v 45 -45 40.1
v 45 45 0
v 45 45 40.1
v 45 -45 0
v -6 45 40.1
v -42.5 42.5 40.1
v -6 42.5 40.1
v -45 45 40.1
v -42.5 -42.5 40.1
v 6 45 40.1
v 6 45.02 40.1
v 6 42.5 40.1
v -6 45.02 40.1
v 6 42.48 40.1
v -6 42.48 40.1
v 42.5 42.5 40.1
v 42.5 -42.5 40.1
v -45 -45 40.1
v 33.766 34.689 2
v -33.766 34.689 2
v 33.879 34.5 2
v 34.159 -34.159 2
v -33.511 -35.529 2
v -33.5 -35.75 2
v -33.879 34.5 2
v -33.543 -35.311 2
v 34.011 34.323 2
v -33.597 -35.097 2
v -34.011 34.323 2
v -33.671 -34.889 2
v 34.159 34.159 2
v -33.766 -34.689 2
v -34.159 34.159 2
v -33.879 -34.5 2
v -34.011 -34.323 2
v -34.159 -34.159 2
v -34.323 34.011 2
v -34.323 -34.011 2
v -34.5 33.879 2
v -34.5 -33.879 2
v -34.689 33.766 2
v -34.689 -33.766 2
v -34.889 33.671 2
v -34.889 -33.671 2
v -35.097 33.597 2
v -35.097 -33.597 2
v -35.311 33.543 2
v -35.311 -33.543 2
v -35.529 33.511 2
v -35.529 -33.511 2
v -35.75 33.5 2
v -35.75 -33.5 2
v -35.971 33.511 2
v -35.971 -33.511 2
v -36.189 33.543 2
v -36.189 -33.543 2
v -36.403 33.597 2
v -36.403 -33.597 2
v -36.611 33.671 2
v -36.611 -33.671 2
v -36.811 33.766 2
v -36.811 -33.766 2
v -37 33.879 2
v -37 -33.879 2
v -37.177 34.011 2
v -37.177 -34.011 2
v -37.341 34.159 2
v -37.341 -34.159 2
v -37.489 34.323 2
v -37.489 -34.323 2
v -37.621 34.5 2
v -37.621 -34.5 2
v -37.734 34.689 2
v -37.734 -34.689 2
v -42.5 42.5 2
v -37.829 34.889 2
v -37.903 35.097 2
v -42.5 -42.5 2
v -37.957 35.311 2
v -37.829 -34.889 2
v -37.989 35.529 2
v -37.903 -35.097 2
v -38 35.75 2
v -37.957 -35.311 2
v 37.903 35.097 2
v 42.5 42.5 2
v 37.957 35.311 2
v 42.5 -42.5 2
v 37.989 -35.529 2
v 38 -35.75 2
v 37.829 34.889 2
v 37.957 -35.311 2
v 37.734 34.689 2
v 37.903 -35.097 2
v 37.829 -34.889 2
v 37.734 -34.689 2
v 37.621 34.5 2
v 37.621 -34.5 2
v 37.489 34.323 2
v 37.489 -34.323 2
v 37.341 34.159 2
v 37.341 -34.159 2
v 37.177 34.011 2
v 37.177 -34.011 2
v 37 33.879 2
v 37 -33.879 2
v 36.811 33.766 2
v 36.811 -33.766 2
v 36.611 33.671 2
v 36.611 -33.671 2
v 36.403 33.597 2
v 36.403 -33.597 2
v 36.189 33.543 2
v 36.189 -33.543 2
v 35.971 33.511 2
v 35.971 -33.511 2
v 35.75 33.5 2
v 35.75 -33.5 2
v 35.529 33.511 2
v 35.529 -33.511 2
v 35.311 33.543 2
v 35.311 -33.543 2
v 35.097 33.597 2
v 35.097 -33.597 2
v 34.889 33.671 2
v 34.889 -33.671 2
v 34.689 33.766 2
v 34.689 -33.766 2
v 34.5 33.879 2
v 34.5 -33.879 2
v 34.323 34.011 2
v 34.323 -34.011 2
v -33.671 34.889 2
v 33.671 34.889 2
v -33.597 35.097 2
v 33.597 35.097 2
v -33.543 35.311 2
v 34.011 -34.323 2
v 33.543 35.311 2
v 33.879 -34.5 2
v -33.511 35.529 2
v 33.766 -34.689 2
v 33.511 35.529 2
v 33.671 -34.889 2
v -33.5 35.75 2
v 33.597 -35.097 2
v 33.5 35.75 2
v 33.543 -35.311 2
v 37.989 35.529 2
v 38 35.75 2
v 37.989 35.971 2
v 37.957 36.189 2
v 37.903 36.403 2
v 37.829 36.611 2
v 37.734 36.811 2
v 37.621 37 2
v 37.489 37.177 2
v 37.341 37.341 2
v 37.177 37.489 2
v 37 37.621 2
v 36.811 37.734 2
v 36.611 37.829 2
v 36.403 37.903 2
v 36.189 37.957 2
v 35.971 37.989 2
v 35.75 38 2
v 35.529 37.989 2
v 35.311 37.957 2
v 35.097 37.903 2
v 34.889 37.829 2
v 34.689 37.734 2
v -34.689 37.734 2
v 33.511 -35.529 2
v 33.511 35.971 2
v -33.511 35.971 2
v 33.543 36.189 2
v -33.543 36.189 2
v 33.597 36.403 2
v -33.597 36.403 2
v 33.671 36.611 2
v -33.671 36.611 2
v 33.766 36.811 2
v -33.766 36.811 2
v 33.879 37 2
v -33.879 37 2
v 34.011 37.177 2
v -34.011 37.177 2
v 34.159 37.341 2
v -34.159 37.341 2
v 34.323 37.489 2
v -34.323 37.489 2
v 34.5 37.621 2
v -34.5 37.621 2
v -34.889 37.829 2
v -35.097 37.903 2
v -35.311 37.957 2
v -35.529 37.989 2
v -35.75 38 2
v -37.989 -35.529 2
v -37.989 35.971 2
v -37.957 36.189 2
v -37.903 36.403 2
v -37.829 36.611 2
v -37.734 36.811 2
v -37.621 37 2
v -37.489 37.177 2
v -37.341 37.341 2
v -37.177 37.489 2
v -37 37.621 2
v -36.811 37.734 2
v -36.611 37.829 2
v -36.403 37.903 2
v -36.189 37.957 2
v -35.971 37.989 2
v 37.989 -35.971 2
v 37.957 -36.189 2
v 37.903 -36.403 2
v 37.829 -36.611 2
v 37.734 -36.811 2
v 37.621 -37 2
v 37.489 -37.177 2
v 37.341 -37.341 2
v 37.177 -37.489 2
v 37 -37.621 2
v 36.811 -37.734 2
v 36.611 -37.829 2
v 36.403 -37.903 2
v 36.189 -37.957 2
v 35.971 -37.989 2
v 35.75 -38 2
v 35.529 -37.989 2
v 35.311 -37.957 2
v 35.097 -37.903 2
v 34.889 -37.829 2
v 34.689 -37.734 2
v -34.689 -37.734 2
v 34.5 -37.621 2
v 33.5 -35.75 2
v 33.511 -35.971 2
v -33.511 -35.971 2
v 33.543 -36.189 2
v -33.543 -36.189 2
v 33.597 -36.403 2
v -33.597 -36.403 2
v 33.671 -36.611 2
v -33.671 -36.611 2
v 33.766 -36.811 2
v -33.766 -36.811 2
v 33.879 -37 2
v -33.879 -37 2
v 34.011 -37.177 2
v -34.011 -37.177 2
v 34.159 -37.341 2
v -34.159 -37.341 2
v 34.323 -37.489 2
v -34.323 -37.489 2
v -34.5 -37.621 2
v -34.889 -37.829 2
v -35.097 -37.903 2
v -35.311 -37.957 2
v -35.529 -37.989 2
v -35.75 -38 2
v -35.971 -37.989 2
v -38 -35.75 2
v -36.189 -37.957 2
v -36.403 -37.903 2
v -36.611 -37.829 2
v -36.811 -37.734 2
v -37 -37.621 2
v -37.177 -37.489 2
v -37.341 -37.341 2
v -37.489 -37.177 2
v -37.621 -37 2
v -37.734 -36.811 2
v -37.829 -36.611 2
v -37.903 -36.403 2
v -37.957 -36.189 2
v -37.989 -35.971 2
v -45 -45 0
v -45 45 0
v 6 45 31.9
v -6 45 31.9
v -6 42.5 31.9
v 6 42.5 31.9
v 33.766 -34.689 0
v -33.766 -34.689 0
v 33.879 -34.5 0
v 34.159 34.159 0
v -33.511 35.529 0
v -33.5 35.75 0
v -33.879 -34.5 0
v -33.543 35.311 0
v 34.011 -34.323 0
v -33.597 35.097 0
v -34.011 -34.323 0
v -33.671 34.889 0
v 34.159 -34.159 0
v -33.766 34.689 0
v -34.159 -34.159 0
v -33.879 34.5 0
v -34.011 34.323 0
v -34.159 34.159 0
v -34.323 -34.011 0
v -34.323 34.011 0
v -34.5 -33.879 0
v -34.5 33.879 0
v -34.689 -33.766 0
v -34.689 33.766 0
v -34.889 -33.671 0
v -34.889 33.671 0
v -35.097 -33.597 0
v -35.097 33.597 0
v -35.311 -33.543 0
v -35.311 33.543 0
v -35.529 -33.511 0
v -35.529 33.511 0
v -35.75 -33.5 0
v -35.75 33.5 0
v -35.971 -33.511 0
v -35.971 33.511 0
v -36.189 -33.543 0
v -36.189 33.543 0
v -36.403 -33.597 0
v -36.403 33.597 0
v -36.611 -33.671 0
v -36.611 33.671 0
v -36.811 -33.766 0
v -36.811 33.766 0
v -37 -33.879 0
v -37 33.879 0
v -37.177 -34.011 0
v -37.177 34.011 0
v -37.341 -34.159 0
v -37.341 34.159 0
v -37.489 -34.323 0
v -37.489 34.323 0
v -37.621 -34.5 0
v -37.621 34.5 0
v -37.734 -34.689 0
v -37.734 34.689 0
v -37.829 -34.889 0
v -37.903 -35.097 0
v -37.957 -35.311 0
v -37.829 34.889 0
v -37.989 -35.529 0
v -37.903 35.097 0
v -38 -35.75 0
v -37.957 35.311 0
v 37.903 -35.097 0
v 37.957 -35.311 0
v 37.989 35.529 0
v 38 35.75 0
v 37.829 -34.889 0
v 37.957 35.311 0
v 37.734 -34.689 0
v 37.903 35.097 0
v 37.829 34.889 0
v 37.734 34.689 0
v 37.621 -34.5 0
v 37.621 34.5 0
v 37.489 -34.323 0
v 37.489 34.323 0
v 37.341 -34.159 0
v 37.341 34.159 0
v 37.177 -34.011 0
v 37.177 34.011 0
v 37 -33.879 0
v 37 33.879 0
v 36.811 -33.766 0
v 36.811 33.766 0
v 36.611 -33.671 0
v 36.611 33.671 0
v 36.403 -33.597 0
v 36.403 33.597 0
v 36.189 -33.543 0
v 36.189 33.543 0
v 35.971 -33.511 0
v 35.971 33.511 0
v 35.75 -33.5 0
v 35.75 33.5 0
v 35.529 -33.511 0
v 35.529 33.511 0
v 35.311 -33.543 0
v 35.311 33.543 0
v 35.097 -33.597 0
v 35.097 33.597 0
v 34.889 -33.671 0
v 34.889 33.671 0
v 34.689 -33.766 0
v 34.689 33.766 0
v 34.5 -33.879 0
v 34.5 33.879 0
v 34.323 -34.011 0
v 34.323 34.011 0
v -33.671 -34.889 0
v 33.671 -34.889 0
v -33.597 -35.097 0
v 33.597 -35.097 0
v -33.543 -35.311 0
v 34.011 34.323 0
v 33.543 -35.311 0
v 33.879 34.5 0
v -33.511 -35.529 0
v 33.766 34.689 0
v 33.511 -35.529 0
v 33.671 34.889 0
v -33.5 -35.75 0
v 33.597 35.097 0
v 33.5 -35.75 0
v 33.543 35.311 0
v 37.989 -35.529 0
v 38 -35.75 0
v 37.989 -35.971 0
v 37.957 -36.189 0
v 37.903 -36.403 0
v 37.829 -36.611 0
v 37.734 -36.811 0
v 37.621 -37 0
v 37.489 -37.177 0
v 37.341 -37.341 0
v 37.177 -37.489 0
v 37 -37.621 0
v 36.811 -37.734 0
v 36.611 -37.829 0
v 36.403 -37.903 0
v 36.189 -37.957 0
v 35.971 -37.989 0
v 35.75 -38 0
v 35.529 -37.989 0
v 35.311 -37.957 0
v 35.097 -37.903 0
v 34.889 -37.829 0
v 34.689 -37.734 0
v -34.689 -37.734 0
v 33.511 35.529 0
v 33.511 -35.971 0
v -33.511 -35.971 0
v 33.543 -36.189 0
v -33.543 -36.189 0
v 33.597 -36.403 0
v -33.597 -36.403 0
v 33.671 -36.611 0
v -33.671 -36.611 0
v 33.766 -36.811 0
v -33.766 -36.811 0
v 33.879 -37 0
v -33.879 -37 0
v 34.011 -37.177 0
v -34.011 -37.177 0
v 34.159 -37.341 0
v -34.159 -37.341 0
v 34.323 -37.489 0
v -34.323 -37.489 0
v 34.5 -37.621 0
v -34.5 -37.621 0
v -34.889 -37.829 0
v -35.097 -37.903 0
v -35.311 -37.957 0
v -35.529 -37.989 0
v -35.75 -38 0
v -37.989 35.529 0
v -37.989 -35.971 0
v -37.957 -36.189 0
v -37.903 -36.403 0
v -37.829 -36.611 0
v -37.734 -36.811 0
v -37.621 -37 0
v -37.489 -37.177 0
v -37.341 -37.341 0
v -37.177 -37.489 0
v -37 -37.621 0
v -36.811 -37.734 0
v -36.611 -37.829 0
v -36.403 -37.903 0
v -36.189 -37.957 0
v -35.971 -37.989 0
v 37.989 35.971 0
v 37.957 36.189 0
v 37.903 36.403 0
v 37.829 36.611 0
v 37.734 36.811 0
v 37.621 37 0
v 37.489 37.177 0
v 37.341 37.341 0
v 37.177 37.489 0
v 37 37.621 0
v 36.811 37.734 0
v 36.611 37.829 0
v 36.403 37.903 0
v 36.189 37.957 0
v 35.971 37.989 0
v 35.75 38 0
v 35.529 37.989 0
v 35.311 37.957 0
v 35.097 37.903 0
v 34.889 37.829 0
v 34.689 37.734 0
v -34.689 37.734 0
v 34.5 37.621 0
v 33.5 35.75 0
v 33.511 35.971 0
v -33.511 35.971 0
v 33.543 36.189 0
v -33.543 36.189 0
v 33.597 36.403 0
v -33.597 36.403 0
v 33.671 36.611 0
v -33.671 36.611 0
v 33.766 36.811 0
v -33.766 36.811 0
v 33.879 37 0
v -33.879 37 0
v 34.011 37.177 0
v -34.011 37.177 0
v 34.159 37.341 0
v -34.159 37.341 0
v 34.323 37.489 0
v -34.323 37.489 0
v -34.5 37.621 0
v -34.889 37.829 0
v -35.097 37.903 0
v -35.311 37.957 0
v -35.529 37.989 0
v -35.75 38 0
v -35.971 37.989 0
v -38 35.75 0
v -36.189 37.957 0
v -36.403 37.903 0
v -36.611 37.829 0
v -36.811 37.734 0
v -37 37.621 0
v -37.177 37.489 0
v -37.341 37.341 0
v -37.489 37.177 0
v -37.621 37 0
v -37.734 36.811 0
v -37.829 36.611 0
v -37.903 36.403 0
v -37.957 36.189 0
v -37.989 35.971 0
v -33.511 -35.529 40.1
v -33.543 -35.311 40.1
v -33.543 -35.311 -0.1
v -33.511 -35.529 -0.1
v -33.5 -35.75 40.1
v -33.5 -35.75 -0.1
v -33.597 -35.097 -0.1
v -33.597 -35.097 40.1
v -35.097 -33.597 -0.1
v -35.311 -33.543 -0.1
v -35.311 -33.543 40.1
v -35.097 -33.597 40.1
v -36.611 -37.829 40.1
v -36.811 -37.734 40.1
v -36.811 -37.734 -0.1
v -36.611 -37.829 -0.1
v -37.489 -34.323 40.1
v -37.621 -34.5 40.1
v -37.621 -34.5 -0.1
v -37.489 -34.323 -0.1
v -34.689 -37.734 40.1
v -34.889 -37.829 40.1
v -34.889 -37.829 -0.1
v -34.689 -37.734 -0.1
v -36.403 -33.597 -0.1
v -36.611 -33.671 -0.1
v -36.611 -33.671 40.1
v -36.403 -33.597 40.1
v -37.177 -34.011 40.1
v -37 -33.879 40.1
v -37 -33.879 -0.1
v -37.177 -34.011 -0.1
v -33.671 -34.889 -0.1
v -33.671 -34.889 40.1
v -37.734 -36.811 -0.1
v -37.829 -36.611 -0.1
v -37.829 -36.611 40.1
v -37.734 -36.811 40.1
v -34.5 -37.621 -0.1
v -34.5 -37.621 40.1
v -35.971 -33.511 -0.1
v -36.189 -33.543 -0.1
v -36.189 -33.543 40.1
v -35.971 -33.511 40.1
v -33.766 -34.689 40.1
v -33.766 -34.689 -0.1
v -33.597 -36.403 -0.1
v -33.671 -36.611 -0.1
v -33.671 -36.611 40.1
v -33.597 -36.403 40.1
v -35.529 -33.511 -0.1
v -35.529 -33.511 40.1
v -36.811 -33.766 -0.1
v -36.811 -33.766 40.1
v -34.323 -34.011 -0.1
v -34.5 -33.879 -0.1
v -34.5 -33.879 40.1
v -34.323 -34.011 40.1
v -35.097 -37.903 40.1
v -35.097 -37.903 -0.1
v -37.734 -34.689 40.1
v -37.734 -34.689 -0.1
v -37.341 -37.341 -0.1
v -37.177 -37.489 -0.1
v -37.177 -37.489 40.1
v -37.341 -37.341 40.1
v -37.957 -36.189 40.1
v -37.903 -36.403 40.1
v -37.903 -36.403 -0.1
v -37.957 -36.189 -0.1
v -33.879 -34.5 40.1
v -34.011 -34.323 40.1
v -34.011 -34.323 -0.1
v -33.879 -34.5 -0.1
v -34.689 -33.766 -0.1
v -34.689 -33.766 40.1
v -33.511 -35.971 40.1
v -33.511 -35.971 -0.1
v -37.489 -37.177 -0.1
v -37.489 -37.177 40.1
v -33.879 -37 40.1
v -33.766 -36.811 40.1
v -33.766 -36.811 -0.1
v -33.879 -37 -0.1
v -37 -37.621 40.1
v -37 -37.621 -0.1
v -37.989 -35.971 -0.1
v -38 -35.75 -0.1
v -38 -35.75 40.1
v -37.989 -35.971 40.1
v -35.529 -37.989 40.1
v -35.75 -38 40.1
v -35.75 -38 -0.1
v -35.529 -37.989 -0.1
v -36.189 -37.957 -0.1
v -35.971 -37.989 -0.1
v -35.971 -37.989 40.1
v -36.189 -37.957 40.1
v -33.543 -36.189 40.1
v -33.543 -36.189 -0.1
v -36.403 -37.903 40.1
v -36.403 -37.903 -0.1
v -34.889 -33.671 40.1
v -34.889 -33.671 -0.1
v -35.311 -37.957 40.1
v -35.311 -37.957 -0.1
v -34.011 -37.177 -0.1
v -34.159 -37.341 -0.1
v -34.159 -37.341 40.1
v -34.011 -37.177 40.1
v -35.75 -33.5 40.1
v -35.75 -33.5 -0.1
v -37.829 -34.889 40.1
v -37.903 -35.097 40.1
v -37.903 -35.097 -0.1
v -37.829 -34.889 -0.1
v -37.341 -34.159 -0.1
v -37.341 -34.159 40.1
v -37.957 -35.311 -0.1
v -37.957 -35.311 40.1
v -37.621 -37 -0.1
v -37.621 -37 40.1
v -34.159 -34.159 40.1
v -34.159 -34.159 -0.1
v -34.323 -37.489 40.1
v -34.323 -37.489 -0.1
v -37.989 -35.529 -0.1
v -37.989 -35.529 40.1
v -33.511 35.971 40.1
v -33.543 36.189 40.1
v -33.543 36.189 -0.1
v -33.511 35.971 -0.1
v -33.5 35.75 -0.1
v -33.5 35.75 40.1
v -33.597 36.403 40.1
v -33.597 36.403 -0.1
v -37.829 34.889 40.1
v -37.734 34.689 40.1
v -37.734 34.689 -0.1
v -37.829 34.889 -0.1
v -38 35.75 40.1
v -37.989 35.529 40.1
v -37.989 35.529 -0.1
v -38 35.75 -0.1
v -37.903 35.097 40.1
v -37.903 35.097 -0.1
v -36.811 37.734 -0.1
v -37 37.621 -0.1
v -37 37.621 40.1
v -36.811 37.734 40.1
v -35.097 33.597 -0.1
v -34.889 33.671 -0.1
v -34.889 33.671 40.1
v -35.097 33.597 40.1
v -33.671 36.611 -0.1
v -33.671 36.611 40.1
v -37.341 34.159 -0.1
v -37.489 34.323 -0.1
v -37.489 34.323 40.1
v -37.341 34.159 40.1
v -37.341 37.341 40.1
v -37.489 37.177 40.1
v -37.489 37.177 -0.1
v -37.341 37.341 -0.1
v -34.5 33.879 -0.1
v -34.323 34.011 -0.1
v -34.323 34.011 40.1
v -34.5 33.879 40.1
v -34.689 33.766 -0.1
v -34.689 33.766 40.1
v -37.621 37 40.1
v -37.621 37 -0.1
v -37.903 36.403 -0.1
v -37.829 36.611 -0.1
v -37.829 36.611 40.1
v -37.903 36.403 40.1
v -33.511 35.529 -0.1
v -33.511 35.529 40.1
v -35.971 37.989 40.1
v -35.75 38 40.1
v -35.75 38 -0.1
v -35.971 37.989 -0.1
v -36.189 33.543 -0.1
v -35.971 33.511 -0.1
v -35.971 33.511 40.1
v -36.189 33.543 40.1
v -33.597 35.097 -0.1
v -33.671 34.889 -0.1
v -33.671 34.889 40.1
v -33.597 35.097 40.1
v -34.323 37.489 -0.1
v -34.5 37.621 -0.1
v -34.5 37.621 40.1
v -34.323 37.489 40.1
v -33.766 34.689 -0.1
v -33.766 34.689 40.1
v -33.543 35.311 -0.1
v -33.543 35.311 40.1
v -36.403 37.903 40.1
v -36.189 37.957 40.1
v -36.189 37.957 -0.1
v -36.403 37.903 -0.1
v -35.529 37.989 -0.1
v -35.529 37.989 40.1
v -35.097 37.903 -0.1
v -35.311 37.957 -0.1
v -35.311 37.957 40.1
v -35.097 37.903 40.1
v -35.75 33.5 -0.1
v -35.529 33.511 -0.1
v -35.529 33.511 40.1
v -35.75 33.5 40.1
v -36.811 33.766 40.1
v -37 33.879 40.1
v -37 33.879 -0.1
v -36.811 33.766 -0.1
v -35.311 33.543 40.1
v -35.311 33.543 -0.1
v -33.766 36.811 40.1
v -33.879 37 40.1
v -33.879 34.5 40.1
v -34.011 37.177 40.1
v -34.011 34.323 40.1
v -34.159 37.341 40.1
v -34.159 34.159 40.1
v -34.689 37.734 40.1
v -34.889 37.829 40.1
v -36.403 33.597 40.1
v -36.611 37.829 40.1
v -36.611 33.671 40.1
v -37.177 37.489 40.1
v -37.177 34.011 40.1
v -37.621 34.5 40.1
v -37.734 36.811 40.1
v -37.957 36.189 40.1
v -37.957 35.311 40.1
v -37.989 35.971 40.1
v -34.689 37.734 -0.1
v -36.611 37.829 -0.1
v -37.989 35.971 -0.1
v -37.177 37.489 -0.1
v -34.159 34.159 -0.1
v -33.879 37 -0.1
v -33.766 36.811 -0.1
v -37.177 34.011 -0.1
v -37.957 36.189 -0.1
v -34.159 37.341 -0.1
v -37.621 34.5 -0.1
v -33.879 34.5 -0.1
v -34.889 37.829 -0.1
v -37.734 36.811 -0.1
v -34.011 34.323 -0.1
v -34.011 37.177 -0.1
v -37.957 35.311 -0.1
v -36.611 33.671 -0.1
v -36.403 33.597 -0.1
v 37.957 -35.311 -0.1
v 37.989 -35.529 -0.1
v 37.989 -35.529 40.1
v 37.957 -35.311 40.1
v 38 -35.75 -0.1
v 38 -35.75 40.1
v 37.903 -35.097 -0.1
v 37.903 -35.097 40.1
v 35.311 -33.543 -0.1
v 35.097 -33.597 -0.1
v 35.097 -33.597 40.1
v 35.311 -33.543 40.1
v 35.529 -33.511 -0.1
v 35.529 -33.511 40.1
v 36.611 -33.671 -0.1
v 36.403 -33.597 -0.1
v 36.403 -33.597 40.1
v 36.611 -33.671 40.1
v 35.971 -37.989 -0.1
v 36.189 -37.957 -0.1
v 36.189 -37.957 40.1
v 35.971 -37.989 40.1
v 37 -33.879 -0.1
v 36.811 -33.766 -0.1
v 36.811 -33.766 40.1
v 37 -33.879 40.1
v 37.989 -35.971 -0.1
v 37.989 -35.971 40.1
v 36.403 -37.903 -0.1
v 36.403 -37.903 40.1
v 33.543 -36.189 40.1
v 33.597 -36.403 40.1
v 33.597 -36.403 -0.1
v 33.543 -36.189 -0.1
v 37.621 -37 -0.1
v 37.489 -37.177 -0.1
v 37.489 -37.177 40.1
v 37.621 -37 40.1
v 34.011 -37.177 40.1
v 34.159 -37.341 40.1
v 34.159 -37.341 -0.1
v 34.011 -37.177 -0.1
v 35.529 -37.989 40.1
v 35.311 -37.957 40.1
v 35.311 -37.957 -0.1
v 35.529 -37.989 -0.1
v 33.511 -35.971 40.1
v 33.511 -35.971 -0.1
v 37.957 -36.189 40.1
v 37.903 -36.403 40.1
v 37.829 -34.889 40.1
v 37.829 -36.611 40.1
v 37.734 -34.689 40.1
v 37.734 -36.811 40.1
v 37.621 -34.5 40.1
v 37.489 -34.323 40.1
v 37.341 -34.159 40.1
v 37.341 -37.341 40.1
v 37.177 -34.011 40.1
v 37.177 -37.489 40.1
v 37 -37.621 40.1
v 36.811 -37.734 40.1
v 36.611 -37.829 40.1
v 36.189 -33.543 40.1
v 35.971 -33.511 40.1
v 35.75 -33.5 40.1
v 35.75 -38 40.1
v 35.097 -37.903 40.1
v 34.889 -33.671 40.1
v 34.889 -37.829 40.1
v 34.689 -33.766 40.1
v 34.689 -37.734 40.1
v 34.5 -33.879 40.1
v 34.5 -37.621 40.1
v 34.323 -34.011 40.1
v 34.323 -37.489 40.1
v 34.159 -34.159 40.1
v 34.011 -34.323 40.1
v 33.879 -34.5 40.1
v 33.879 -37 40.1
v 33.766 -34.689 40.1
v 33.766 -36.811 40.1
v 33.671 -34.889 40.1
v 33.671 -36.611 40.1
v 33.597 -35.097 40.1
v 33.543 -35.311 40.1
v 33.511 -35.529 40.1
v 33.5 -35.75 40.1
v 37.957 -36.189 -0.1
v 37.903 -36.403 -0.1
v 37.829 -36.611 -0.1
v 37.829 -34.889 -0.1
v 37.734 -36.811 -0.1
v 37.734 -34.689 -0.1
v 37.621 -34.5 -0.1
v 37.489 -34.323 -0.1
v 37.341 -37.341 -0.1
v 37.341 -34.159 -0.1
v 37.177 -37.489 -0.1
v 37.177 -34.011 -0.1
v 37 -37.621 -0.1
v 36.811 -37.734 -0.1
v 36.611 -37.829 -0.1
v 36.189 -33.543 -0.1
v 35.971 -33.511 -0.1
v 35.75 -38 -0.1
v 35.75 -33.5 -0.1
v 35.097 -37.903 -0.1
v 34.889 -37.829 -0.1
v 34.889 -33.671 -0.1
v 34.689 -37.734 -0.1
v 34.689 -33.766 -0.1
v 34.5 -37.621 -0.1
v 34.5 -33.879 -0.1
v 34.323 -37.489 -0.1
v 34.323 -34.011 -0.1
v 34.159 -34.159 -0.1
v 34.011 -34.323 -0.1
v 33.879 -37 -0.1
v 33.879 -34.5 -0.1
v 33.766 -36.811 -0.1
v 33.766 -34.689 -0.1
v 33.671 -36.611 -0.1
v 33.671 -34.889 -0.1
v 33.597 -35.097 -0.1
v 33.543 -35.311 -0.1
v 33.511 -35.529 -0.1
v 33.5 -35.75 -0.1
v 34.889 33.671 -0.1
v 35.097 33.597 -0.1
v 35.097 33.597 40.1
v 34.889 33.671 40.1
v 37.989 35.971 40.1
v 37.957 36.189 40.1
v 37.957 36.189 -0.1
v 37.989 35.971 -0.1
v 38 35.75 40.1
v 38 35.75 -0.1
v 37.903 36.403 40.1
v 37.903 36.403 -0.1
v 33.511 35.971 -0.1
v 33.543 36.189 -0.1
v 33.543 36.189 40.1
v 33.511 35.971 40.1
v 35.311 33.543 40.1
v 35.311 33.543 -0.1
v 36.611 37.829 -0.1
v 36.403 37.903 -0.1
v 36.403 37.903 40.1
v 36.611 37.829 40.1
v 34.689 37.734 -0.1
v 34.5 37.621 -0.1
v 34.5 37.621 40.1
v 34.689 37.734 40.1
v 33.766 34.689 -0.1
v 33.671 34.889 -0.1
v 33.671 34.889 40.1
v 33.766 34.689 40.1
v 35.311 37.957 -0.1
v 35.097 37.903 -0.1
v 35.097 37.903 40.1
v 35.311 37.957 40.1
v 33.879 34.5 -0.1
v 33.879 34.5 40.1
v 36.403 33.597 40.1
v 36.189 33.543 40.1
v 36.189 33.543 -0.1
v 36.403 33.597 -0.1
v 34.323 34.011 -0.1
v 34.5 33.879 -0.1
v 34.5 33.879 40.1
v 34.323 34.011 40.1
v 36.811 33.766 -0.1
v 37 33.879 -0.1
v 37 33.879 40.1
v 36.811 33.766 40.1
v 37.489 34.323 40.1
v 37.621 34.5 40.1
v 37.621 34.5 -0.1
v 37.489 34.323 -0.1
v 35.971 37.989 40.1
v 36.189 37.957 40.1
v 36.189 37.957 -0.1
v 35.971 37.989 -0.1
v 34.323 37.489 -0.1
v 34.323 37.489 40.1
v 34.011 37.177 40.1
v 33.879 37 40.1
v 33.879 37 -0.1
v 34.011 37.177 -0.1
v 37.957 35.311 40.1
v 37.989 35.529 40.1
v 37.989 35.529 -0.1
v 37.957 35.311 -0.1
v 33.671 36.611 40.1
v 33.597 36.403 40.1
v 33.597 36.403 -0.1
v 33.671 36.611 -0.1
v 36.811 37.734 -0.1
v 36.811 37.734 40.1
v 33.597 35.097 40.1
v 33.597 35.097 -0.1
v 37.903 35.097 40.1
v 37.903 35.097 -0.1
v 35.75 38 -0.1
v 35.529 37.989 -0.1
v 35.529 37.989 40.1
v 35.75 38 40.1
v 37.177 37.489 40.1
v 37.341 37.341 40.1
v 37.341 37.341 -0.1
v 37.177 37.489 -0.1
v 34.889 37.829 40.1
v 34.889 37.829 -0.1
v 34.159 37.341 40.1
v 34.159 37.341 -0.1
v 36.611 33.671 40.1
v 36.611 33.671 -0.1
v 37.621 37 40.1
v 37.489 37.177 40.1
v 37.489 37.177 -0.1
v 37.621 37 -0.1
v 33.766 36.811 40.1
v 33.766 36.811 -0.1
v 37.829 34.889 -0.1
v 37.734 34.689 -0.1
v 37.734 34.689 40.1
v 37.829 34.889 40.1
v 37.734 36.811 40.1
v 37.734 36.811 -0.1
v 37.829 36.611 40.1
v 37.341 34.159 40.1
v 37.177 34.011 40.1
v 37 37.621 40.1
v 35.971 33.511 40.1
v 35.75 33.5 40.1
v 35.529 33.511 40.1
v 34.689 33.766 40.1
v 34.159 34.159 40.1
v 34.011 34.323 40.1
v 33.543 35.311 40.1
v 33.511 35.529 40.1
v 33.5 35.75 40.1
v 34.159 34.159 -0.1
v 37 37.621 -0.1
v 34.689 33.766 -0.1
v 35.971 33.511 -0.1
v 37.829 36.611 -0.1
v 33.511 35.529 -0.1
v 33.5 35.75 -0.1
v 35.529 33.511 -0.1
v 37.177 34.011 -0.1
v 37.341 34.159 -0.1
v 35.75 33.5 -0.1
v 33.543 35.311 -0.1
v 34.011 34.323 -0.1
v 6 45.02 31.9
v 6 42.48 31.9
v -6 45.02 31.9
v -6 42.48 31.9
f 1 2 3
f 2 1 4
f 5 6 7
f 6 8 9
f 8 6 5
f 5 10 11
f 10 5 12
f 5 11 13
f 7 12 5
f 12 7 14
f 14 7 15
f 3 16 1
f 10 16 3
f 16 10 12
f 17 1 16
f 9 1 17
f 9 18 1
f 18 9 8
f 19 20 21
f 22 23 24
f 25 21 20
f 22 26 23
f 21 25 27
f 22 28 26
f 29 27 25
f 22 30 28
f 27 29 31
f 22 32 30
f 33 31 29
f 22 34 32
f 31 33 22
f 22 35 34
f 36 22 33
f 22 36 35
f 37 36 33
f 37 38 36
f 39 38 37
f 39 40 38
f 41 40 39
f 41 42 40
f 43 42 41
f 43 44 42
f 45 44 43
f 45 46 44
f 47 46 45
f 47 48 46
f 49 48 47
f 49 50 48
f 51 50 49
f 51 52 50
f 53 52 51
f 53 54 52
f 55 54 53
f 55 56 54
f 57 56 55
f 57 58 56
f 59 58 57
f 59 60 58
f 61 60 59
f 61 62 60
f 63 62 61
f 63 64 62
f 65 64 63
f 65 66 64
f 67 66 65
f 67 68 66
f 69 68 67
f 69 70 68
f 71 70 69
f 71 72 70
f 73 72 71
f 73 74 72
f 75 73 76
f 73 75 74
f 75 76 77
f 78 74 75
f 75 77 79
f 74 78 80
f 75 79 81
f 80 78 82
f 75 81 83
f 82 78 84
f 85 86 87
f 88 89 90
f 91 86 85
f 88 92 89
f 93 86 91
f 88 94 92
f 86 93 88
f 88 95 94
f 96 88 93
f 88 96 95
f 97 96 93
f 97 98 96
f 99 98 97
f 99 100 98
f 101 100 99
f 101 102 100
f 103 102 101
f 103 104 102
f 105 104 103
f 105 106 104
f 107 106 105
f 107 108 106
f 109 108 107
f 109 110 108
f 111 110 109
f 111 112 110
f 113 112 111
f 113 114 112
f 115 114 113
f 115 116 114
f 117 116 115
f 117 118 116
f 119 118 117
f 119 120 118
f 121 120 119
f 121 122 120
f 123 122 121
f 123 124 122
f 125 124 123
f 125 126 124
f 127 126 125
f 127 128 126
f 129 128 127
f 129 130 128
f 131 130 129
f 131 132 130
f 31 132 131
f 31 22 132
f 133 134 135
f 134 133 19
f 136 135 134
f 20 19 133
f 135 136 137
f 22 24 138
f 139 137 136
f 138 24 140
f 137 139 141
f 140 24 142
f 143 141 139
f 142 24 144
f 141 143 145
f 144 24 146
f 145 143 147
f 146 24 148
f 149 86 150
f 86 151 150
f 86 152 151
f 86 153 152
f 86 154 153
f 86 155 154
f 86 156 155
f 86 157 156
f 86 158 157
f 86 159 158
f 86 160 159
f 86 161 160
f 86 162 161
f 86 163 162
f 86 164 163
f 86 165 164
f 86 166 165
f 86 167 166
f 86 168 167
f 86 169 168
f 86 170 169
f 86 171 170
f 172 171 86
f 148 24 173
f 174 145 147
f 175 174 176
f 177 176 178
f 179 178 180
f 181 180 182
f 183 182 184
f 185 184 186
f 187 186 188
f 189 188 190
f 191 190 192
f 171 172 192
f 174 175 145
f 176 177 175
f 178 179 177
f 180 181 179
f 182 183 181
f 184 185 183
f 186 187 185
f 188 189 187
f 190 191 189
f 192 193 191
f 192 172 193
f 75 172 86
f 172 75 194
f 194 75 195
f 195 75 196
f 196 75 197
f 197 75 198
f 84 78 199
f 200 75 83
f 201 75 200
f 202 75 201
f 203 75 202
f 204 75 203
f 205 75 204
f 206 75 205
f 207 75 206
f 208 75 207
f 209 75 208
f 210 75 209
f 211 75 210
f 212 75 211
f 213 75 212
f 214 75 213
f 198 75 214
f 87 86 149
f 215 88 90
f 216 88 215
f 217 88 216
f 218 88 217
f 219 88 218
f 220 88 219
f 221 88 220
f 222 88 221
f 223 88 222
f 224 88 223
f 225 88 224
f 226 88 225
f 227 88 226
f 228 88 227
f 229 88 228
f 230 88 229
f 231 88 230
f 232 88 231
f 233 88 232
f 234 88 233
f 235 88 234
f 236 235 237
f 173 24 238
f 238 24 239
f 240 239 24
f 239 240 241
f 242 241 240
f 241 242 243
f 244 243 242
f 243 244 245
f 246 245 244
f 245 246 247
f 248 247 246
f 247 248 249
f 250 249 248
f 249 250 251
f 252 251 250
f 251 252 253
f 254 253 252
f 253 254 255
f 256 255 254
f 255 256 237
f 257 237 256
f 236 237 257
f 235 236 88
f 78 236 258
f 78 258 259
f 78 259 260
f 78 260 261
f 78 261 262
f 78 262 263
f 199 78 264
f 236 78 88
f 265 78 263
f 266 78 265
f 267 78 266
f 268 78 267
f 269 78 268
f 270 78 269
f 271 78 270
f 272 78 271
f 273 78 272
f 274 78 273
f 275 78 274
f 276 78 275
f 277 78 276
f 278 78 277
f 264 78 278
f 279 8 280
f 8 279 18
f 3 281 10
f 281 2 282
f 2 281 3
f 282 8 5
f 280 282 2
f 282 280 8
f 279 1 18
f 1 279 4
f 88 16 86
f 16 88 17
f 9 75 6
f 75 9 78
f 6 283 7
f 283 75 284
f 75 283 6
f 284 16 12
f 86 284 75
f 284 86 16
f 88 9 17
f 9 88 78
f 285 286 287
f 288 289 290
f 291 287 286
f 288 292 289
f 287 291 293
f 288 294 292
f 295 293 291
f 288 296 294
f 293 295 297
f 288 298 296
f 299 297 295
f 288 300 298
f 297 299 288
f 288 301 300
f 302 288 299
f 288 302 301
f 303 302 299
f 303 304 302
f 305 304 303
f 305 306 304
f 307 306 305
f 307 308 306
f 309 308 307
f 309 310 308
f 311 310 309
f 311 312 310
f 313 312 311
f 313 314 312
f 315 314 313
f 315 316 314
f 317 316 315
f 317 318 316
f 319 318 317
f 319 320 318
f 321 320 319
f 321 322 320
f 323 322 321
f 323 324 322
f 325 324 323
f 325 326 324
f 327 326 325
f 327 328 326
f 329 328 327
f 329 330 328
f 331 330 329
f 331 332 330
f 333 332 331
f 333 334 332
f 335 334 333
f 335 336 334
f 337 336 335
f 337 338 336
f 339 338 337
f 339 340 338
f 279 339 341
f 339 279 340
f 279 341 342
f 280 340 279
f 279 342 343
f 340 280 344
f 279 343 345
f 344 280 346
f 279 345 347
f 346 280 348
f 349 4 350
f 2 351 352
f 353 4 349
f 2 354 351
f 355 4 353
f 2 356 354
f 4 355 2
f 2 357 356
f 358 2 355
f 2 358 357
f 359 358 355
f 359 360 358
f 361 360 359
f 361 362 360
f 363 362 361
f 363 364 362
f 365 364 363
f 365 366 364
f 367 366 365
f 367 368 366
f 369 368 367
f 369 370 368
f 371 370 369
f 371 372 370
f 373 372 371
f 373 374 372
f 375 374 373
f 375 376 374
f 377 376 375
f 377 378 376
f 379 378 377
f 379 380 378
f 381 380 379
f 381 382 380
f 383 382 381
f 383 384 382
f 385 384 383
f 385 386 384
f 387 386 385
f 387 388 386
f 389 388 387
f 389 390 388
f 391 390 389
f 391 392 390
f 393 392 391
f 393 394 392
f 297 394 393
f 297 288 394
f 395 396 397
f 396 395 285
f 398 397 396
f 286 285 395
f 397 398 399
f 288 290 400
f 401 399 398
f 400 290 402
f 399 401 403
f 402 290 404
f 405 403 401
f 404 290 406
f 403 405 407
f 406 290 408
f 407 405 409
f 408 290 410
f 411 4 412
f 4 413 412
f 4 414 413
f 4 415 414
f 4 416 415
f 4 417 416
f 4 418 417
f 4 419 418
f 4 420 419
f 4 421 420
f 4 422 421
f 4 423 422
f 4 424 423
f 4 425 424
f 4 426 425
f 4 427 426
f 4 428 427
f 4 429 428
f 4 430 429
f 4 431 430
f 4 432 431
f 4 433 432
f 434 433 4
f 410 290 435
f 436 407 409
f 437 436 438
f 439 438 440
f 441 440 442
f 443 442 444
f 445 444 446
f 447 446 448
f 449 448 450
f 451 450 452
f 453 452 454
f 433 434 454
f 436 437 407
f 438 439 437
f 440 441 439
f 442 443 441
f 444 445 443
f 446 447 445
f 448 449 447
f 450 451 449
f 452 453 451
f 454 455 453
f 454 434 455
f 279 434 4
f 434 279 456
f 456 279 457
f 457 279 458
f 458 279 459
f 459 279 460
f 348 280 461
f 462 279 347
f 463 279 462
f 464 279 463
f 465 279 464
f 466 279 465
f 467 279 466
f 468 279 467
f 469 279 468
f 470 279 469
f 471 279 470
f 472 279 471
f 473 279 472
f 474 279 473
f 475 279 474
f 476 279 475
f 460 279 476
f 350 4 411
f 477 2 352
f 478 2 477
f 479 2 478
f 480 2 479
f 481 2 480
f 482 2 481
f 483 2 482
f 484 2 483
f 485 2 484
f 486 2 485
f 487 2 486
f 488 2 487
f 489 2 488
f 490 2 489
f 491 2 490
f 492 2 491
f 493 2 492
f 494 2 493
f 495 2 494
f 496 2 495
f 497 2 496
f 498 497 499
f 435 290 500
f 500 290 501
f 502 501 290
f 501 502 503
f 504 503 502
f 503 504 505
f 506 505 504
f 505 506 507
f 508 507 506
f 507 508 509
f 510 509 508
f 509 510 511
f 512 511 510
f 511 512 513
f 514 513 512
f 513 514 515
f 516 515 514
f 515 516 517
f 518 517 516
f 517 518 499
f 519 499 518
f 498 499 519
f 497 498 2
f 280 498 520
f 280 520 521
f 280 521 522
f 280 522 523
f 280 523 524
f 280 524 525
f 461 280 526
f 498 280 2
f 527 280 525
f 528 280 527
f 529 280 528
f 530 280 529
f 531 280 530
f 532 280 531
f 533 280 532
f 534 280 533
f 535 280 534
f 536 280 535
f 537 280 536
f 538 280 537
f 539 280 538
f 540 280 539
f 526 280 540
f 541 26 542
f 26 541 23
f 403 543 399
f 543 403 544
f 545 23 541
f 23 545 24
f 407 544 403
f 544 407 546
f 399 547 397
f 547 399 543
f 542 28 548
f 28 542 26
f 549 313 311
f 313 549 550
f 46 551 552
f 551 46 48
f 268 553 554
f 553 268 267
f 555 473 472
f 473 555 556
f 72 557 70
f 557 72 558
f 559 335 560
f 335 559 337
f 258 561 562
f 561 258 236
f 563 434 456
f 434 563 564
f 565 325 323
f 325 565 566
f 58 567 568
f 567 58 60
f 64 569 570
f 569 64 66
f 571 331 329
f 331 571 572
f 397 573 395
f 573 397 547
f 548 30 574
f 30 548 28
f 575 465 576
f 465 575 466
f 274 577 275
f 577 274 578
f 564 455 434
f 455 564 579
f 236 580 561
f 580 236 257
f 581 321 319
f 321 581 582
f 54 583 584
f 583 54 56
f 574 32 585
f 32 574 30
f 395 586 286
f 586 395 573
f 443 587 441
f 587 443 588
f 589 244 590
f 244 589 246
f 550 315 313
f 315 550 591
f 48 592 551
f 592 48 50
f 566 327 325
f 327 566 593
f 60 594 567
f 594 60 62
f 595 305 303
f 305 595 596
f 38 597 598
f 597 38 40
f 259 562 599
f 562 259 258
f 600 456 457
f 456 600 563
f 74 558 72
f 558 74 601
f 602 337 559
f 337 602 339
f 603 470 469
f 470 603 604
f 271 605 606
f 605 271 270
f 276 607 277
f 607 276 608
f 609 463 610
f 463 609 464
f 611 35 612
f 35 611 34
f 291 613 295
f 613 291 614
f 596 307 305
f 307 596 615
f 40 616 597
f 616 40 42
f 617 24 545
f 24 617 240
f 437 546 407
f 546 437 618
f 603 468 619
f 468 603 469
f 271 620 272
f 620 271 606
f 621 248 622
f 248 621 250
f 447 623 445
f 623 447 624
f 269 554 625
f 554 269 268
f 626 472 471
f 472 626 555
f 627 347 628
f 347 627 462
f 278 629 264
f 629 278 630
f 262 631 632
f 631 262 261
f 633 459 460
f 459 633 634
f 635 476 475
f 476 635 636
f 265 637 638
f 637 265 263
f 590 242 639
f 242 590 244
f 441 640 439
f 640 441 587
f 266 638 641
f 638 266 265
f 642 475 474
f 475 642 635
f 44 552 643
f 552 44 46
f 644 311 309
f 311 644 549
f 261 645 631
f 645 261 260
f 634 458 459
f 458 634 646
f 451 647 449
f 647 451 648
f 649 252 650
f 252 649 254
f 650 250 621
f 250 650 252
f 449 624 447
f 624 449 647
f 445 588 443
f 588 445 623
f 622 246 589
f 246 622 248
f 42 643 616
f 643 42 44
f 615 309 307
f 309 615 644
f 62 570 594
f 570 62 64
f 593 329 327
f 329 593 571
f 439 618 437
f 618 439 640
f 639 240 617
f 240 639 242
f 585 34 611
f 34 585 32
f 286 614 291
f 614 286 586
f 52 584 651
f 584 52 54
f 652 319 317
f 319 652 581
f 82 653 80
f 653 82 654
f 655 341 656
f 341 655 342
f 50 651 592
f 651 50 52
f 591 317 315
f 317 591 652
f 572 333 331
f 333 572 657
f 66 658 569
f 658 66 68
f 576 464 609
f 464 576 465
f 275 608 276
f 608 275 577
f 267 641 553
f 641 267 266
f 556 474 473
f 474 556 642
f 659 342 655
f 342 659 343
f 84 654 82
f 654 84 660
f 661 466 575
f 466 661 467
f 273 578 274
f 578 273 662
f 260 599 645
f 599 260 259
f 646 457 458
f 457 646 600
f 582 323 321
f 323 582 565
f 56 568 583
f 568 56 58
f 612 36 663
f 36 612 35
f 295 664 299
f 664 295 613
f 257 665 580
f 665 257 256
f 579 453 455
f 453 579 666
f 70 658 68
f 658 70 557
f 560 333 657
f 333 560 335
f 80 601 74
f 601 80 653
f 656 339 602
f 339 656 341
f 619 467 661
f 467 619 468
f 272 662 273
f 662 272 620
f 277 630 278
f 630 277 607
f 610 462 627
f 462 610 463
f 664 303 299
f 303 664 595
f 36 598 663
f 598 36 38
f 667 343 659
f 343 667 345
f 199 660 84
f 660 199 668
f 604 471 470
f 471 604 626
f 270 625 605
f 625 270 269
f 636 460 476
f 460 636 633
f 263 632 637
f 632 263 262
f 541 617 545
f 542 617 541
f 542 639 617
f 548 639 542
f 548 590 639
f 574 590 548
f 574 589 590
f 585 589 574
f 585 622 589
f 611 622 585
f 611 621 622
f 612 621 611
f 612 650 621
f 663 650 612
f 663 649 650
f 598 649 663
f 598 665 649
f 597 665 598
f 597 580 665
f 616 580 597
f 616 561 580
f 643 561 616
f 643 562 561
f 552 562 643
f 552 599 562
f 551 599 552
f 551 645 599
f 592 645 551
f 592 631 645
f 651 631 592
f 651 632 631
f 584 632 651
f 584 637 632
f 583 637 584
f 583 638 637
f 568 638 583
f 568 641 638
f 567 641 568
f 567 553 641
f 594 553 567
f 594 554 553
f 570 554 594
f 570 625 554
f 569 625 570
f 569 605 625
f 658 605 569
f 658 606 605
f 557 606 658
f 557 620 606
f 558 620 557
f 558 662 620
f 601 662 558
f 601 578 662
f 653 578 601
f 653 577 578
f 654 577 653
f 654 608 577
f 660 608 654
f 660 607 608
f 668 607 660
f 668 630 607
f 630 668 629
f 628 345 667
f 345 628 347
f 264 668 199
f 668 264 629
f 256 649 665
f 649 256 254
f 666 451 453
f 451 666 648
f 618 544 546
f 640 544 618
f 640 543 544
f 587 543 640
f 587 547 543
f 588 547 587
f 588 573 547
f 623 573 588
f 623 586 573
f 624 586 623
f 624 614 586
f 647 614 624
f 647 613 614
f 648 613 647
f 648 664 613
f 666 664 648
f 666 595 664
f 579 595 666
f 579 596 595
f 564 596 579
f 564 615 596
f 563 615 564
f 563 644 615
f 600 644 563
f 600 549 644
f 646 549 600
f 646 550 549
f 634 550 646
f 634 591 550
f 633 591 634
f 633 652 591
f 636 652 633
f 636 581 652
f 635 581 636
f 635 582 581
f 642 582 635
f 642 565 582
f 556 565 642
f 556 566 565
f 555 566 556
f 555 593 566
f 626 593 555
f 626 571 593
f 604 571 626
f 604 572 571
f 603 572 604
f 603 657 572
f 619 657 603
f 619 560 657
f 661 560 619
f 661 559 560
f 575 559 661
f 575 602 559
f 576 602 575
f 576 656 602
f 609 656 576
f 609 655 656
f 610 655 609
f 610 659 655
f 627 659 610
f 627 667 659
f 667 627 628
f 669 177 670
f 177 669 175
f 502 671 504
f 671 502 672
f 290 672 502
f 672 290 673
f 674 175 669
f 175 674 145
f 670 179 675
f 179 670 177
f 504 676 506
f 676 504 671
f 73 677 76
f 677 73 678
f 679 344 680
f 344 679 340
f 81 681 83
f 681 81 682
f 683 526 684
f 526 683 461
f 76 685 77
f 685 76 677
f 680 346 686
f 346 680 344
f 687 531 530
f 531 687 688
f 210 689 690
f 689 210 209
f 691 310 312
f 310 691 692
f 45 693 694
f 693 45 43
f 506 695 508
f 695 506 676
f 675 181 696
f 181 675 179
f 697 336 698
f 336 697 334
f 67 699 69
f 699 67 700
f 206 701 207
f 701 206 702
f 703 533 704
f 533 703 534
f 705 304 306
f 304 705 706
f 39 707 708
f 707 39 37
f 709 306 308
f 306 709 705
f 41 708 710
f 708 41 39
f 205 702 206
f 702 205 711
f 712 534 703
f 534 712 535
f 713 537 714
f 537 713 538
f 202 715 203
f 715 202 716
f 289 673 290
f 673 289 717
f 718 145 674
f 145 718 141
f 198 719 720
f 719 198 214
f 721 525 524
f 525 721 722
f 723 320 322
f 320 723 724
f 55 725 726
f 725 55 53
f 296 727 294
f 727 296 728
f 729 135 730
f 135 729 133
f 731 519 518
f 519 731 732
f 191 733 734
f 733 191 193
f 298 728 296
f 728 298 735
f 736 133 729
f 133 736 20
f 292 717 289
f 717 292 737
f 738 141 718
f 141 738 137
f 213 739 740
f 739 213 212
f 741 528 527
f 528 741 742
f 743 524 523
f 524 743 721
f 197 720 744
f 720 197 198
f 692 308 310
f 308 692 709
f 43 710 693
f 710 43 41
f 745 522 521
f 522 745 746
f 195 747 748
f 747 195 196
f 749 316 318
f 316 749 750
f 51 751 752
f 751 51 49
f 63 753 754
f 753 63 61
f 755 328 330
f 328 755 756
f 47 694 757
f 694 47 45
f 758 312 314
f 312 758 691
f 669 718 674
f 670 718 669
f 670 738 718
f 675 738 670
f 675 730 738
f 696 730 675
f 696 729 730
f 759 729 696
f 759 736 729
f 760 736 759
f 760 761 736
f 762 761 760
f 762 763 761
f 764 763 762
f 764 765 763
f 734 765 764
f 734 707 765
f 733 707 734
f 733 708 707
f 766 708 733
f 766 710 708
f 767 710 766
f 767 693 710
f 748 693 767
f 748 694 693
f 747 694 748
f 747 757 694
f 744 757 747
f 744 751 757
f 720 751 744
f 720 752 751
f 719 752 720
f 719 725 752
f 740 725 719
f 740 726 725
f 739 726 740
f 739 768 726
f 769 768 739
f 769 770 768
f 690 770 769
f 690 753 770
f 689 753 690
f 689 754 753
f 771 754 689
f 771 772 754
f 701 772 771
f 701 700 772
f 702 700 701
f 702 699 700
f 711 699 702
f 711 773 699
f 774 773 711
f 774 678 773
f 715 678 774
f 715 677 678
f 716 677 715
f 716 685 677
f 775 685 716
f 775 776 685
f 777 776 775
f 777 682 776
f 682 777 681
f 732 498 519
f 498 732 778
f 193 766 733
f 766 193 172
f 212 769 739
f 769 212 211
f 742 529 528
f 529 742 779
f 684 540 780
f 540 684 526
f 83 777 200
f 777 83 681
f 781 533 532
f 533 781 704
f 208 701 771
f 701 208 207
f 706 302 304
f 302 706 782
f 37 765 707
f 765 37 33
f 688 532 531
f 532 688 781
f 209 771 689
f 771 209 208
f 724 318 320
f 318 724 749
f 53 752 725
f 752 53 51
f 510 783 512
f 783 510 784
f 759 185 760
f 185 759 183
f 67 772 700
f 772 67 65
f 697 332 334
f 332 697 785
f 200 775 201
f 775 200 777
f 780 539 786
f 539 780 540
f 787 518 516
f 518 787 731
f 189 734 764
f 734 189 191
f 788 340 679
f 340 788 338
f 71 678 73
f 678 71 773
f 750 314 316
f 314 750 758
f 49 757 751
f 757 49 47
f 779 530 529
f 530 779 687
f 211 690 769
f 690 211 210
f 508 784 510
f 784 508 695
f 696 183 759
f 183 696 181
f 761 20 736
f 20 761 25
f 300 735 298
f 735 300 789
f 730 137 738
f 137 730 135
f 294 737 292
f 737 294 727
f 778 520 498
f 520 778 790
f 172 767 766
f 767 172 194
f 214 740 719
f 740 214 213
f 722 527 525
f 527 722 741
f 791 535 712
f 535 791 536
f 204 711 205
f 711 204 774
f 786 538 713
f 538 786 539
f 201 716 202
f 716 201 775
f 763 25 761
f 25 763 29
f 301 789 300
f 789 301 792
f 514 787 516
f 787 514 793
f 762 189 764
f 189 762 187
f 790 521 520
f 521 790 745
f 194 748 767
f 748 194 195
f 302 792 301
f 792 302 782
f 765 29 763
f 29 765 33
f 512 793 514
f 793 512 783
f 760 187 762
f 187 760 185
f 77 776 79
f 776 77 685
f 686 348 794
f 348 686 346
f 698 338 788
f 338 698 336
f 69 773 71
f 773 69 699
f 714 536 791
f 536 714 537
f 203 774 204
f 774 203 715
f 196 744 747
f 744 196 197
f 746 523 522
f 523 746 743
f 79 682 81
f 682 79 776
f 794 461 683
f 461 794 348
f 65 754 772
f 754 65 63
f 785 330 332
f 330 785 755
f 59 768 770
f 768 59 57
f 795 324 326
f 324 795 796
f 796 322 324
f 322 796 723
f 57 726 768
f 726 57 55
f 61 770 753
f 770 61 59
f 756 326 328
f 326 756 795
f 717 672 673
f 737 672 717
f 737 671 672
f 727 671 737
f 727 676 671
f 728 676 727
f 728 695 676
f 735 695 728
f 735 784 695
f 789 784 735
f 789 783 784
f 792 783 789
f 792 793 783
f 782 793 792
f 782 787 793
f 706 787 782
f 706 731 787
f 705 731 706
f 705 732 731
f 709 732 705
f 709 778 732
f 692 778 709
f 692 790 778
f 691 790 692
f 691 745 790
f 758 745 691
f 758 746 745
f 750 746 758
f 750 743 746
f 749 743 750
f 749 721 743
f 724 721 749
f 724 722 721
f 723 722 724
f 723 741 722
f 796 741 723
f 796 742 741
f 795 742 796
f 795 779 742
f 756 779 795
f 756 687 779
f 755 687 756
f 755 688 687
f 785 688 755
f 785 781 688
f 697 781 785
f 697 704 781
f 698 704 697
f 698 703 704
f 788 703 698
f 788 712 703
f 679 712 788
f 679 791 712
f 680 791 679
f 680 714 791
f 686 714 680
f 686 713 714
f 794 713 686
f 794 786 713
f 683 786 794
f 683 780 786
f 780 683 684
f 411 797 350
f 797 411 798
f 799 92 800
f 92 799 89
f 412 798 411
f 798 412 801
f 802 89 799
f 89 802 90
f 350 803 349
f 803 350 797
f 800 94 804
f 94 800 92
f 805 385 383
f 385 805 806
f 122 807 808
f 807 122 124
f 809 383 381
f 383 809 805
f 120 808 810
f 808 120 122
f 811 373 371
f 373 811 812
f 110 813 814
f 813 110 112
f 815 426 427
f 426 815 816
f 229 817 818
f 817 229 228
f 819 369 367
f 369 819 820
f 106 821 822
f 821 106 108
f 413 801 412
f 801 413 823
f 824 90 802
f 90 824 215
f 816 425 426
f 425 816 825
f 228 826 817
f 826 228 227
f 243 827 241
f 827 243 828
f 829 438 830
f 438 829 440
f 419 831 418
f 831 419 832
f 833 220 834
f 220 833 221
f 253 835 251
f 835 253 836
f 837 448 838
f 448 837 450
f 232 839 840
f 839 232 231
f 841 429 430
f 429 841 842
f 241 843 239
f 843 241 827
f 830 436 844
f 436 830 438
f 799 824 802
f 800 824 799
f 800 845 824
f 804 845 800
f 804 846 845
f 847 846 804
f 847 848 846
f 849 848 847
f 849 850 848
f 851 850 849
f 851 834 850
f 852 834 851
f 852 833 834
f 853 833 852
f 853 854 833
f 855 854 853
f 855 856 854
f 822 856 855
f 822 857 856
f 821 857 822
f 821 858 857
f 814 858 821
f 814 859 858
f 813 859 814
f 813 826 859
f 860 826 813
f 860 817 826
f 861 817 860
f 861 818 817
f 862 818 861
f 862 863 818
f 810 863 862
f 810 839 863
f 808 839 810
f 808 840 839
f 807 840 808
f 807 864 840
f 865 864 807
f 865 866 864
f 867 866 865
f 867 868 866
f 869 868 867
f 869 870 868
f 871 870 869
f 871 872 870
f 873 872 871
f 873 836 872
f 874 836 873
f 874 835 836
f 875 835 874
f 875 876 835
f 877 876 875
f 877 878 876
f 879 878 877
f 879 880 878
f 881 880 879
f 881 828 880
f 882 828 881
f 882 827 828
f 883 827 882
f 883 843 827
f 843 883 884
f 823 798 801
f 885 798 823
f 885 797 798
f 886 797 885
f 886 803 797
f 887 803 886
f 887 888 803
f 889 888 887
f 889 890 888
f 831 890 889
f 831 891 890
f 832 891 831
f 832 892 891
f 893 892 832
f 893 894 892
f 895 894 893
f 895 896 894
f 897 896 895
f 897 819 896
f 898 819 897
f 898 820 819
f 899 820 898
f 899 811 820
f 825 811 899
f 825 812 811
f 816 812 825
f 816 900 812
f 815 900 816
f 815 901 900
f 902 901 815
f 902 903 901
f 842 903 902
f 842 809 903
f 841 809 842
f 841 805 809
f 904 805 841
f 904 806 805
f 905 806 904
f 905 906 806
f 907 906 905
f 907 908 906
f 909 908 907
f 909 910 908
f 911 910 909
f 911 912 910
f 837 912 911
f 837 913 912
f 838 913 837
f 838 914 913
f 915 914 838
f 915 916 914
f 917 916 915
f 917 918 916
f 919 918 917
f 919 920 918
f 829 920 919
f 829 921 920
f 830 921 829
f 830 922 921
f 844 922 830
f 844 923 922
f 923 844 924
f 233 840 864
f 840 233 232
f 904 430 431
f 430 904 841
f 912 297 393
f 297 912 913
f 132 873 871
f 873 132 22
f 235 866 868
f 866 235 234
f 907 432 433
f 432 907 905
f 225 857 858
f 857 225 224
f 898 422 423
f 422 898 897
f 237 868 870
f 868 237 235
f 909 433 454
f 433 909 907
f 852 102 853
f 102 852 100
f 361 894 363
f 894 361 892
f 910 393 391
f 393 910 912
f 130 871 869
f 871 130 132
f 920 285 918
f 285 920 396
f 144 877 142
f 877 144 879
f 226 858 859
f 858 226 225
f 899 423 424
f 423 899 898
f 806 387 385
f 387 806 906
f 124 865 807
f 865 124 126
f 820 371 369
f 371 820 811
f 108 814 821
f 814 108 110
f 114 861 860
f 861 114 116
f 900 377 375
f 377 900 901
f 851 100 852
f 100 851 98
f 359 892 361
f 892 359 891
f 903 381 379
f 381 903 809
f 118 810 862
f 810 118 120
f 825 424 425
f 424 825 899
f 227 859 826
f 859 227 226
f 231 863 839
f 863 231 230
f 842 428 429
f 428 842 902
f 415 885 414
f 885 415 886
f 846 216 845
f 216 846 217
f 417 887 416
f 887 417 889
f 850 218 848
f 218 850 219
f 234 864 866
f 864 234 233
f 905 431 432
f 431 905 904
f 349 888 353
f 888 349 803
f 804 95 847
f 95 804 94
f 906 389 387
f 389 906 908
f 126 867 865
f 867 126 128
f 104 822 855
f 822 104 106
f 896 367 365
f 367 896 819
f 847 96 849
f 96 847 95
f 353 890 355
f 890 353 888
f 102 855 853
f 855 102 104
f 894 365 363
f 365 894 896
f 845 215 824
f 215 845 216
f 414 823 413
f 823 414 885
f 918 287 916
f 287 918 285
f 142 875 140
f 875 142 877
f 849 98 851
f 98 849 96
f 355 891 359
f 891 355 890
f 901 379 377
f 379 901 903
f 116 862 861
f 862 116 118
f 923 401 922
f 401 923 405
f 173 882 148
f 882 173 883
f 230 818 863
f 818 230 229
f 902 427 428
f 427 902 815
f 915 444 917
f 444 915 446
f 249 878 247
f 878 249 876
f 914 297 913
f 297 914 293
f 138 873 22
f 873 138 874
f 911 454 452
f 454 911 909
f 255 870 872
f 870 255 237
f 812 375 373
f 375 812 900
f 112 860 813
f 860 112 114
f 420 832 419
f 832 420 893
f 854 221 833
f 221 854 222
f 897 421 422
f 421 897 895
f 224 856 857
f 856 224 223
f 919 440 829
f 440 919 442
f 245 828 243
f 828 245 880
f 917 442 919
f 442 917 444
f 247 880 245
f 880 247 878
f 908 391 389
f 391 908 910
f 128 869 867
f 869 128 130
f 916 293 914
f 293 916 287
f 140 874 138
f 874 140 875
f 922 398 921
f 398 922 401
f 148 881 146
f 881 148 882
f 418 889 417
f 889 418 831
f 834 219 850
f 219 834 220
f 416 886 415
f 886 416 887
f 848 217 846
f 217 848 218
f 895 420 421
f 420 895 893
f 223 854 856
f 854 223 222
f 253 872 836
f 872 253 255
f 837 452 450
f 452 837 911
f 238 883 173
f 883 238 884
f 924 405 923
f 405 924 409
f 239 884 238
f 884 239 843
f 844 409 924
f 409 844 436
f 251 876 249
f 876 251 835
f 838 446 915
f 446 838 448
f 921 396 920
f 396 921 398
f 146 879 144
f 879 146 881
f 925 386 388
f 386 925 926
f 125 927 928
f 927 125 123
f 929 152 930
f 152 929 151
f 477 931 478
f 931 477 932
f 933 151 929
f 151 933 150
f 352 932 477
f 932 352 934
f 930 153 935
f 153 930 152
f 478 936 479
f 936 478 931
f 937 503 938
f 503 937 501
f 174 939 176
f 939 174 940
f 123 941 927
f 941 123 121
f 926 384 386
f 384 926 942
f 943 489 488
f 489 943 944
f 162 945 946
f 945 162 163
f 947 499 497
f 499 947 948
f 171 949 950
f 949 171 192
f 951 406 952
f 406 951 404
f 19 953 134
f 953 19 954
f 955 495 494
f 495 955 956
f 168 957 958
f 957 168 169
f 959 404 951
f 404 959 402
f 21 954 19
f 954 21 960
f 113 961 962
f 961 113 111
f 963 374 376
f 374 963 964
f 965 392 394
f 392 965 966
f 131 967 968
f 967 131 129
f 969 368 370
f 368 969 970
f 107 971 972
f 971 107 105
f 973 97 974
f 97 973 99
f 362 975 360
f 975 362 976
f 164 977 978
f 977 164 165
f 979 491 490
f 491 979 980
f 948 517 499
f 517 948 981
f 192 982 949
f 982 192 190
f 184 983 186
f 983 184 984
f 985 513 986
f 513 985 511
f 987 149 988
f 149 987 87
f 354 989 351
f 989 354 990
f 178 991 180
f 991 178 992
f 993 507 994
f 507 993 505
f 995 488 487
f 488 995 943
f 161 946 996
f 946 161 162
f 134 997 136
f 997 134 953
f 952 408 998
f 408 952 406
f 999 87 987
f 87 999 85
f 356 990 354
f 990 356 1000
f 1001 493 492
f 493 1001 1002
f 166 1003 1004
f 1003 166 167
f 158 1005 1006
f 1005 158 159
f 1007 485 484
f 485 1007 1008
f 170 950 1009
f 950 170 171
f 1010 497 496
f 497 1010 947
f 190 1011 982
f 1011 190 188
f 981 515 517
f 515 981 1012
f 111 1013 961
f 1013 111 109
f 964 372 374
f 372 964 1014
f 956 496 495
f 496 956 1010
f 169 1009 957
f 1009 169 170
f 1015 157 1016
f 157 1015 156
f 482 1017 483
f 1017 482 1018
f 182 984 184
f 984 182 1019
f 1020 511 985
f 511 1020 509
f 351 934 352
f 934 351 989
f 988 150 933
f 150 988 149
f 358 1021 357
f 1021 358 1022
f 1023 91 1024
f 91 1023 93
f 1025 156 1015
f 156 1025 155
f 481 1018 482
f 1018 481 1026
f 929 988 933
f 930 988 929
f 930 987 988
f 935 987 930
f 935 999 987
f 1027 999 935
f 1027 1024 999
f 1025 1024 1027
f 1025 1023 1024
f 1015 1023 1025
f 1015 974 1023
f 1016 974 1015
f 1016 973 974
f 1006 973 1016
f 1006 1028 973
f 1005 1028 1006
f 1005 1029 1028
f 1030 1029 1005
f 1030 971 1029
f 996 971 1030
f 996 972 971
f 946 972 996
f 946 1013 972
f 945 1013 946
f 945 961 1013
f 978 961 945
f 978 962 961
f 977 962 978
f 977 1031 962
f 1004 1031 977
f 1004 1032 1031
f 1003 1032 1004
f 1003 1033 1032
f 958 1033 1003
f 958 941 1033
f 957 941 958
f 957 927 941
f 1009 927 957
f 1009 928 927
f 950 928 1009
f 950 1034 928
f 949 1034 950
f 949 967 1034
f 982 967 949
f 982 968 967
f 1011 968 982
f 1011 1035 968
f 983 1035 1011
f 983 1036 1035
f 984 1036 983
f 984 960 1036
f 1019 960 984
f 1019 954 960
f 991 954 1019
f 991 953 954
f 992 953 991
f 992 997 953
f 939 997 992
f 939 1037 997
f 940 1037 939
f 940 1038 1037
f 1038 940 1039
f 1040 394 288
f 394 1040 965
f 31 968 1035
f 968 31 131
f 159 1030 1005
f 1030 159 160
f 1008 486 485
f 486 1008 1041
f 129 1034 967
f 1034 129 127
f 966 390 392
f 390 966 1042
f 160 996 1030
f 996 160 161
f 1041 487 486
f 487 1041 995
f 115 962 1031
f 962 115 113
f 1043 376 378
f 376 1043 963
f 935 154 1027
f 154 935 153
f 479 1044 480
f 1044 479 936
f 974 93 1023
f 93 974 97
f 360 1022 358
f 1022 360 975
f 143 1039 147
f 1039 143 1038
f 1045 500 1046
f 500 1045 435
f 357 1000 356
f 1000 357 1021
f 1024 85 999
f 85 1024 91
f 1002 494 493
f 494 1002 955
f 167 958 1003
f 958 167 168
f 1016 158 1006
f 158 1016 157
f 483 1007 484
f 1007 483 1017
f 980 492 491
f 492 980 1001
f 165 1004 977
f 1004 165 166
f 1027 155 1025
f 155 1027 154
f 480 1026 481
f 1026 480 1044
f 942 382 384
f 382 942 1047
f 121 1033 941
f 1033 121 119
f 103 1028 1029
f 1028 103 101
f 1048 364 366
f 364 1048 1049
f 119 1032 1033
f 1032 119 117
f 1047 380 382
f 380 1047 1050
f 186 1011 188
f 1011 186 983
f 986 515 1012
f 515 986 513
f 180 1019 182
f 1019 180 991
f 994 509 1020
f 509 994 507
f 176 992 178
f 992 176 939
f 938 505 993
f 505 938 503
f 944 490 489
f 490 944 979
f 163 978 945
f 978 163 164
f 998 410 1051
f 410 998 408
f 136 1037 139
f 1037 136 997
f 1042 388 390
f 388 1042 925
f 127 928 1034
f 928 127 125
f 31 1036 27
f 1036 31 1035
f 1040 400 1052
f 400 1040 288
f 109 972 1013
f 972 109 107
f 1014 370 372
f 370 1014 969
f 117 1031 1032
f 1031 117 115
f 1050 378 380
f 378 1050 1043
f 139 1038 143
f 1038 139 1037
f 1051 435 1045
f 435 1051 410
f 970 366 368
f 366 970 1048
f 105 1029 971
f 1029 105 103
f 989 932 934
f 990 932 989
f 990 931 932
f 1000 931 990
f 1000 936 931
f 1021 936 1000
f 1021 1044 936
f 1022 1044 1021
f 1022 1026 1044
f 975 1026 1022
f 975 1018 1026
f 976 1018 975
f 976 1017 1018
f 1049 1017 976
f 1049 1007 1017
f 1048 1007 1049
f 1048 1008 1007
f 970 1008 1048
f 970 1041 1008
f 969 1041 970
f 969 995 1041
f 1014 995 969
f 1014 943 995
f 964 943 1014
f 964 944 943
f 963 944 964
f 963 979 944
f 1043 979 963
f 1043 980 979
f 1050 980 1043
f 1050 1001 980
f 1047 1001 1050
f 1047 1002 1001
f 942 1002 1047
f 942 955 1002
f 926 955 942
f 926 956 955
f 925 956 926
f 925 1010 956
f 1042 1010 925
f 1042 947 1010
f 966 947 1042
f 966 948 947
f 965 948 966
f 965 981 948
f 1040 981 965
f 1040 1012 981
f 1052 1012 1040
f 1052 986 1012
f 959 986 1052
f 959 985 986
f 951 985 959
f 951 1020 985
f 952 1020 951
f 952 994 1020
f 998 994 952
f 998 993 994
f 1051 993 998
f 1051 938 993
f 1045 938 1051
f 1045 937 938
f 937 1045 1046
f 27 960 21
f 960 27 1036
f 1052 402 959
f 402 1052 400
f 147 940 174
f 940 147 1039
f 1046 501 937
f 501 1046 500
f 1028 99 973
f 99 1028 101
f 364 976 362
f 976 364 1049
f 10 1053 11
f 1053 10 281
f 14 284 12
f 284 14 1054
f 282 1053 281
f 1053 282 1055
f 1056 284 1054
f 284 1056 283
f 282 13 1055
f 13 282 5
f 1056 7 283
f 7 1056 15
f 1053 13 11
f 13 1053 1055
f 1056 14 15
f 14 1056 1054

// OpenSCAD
// Parameters (mm)
thickness_top = 2;               // top plate thickness
wall_thickness = 2.5;            // wall thickness
height_total   = 40;              // overall height (from bed to open edge)
outer_size    = 90;               // outer X and Y dimensions
hole_dia      = 4.5;              // M4 screw hole diameter
hole_pattern  = 71.5;            // spacing of the four mounting holes (square pattern)
cable_notch_width = 12;          // width of cable notch
cable_notch_depth = 8;           // depth of notch down from open edge (z = 32 → 40)
cable_notch_extra = 0.02;        // extra material to ensure cut is not coplanar
cut_extra = 0.1;                 // generic extra for all cutting bodies

$fn = 64;                         // smoothness for cylinders & circles

// ---------- Helper modules ----------
module top_plate() {
    // 90 × 90 mm plate, centered, thickness 2 mm
    translate([-outer_size/2, -outer_size/2, 0])
        cube([outer_size, outer_size, thickness_top]);
}

module walls() {
    // Outer box (from top plate up to full height)
    outer_h = height_total - thickness_top;
    translate([-outer_size/2, -outer_size/2, thickness_top])
        cube([outer_size, outer_size, outer_h + cut_extra]); // extend a bit beyond top

    // Inner cavity to be removed (slightly larger to avoid coplanar faces)
    inner_size = outer_size - 2*wall_thickness;
    translate([-inner_size/2, -inner_size/2, thickness_top])
        cube([inner_size, inner_size, outer_h + cut_extra]);
}

// ---------- Main solid ----------
module housing() {
    // Union of top plate and walls, then subtract inner cavity, holes and cable notch
    union() {
        top_plate();
        // Build walls as a thick shell (outer minus inner)
        difference() {
            // outer shell
            translate([-outer_size/2, -outer_size/2, thickness_top])
                cube([outer_size, outer_size, height_total - thickness_top + cut_extra]);
            // inner cavity (slightly larger)
            translate([-(outer_size-2*wall_thickness)/2, -(outer_size-2*wall_thickness)/2,
                      thickness_top - cut_extra])
                cube([outer_size-2*wall_thickness, outer_size-2*wall_thickness,
                      height_total - thickness_top + 2*cut_extra]);
        }
    }

    // Subtract mounting holes (through the whole part)
    for (dx = [-hole_pattern/2, hole_pattern/2])
        for (dy = [-hole_pattern/2, hole_pattern/2])
            translate([dx, dy, -cut_extra])
                cylinder(h = height_total + 2*cut_extra, r = hole_dia/2, center = false);
    
    // Subtract cable notch from the front wall (y = +outer_size/2)
    // Notch dimensions: width × depth × height
    // depth = wall_thickness + extra, height = cable_notch_depth + extra
    translate([-cable_notch_width/2,
              outer_size/2 - wall_thickness - cable_notch_extra,
              height_total - cable_notch_depth - cut_extra])
        cube([cable_notch_width,
              wall_thickness + 2*cable_notch_extra,
              cable_notch_depth + 2*cut_extra]);
}

// ---------- Render ----------
housing();
